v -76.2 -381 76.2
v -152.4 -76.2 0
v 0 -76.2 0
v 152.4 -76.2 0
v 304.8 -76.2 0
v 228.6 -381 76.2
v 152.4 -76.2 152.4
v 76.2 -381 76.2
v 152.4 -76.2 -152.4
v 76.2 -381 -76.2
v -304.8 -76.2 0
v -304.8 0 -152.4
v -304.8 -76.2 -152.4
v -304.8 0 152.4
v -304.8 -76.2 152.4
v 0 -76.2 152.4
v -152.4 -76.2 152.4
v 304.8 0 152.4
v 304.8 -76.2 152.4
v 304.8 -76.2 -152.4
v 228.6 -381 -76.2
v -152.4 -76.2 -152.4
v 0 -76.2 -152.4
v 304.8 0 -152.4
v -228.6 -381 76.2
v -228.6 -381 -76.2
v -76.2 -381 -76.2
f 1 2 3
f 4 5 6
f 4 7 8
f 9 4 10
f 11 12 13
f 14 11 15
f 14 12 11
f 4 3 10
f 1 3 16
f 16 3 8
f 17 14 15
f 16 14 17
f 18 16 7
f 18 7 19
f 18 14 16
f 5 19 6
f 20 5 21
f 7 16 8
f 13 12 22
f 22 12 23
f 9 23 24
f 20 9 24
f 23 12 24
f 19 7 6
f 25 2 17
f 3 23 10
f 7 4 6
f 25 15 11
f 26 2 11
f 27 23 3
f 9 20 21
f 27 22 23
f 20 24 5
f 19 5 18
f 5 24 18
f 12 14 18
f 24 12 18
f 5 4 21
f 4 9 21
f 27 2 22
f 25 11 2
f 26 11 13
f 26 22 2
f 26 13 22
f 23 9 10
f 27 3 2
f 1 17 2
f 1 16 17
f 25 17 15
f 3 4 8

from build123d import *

# Parameters (mm, degrees)
F0_W     = 609.6
F0_H     = 304.8
F1_DEPTH = 76.2
F3_W     = 152.4
F3_H     = 152.4
F6_W     = 152.4
F6_H     = 152.4
F9_W     = 152.4
F9_H     = 152.4
F12_W    = 152.4
F12_H    = 152.4


with BuildPart() as f1:
    # F0 (on Front) → F1 (new body)
    with BuildSketch(Plane.XZ):
        Rectangle(F0_W, F0_H)
    extrude(amount=F1_DEPTH)

    # F3 (on face) → F5 section 0
    with BuildSketch(Plane.XZ.offset(76.2), mode=Mode.PRIVATE) as f5_s0:
        with Locations((-228.6, 76.2)):
            Rectangle(F3_W, F3_H)
    loft([f5_s0.sketch, Vertex(-228.6, -381, 76.2)])

    # F6 (on face) → F8 section 0
    with BuildSketch(Plane.XZ.offset(76.2), mode=Mode.PRIVATE) as f8_s0:
        with Locations((-76.2, 76.2)):
            Rectangle(F6_W, F6_H)
    loft([f8_s0.sketch, Vertex(-76.2, -381, 76.2)])

    # F9 (on face) → F11 section 0
    with BuildSketch(Plane.XZ.offset(76.2), mode=Mode.PRIVATE) as f11_s0:
        with Locations((-228.6, -76.2)):
            Rectangle(F9_W, F9_H)
    loft([f11_s0.sketch, Vertex(-228.6, -381, -76.2)])

    # F12 (on face) → F14 section 0
    with BuildSketch(Plane.XZ.offset(76.2), mode=Mode.PRIVATE) as f14_s0:
        with Locations((-76.2, -76.2)):
            Rectangle(F12_W, F12_H)
    loft([f14_s0.sketch, Vertex(-76.2, -381, -76.2)])

    # F15: F1 across plane


with BuildPart() as f1_1:
    add(f1.part)
    add(f1.part.mirror(Plane.YZ))


solid = f1_1.part
